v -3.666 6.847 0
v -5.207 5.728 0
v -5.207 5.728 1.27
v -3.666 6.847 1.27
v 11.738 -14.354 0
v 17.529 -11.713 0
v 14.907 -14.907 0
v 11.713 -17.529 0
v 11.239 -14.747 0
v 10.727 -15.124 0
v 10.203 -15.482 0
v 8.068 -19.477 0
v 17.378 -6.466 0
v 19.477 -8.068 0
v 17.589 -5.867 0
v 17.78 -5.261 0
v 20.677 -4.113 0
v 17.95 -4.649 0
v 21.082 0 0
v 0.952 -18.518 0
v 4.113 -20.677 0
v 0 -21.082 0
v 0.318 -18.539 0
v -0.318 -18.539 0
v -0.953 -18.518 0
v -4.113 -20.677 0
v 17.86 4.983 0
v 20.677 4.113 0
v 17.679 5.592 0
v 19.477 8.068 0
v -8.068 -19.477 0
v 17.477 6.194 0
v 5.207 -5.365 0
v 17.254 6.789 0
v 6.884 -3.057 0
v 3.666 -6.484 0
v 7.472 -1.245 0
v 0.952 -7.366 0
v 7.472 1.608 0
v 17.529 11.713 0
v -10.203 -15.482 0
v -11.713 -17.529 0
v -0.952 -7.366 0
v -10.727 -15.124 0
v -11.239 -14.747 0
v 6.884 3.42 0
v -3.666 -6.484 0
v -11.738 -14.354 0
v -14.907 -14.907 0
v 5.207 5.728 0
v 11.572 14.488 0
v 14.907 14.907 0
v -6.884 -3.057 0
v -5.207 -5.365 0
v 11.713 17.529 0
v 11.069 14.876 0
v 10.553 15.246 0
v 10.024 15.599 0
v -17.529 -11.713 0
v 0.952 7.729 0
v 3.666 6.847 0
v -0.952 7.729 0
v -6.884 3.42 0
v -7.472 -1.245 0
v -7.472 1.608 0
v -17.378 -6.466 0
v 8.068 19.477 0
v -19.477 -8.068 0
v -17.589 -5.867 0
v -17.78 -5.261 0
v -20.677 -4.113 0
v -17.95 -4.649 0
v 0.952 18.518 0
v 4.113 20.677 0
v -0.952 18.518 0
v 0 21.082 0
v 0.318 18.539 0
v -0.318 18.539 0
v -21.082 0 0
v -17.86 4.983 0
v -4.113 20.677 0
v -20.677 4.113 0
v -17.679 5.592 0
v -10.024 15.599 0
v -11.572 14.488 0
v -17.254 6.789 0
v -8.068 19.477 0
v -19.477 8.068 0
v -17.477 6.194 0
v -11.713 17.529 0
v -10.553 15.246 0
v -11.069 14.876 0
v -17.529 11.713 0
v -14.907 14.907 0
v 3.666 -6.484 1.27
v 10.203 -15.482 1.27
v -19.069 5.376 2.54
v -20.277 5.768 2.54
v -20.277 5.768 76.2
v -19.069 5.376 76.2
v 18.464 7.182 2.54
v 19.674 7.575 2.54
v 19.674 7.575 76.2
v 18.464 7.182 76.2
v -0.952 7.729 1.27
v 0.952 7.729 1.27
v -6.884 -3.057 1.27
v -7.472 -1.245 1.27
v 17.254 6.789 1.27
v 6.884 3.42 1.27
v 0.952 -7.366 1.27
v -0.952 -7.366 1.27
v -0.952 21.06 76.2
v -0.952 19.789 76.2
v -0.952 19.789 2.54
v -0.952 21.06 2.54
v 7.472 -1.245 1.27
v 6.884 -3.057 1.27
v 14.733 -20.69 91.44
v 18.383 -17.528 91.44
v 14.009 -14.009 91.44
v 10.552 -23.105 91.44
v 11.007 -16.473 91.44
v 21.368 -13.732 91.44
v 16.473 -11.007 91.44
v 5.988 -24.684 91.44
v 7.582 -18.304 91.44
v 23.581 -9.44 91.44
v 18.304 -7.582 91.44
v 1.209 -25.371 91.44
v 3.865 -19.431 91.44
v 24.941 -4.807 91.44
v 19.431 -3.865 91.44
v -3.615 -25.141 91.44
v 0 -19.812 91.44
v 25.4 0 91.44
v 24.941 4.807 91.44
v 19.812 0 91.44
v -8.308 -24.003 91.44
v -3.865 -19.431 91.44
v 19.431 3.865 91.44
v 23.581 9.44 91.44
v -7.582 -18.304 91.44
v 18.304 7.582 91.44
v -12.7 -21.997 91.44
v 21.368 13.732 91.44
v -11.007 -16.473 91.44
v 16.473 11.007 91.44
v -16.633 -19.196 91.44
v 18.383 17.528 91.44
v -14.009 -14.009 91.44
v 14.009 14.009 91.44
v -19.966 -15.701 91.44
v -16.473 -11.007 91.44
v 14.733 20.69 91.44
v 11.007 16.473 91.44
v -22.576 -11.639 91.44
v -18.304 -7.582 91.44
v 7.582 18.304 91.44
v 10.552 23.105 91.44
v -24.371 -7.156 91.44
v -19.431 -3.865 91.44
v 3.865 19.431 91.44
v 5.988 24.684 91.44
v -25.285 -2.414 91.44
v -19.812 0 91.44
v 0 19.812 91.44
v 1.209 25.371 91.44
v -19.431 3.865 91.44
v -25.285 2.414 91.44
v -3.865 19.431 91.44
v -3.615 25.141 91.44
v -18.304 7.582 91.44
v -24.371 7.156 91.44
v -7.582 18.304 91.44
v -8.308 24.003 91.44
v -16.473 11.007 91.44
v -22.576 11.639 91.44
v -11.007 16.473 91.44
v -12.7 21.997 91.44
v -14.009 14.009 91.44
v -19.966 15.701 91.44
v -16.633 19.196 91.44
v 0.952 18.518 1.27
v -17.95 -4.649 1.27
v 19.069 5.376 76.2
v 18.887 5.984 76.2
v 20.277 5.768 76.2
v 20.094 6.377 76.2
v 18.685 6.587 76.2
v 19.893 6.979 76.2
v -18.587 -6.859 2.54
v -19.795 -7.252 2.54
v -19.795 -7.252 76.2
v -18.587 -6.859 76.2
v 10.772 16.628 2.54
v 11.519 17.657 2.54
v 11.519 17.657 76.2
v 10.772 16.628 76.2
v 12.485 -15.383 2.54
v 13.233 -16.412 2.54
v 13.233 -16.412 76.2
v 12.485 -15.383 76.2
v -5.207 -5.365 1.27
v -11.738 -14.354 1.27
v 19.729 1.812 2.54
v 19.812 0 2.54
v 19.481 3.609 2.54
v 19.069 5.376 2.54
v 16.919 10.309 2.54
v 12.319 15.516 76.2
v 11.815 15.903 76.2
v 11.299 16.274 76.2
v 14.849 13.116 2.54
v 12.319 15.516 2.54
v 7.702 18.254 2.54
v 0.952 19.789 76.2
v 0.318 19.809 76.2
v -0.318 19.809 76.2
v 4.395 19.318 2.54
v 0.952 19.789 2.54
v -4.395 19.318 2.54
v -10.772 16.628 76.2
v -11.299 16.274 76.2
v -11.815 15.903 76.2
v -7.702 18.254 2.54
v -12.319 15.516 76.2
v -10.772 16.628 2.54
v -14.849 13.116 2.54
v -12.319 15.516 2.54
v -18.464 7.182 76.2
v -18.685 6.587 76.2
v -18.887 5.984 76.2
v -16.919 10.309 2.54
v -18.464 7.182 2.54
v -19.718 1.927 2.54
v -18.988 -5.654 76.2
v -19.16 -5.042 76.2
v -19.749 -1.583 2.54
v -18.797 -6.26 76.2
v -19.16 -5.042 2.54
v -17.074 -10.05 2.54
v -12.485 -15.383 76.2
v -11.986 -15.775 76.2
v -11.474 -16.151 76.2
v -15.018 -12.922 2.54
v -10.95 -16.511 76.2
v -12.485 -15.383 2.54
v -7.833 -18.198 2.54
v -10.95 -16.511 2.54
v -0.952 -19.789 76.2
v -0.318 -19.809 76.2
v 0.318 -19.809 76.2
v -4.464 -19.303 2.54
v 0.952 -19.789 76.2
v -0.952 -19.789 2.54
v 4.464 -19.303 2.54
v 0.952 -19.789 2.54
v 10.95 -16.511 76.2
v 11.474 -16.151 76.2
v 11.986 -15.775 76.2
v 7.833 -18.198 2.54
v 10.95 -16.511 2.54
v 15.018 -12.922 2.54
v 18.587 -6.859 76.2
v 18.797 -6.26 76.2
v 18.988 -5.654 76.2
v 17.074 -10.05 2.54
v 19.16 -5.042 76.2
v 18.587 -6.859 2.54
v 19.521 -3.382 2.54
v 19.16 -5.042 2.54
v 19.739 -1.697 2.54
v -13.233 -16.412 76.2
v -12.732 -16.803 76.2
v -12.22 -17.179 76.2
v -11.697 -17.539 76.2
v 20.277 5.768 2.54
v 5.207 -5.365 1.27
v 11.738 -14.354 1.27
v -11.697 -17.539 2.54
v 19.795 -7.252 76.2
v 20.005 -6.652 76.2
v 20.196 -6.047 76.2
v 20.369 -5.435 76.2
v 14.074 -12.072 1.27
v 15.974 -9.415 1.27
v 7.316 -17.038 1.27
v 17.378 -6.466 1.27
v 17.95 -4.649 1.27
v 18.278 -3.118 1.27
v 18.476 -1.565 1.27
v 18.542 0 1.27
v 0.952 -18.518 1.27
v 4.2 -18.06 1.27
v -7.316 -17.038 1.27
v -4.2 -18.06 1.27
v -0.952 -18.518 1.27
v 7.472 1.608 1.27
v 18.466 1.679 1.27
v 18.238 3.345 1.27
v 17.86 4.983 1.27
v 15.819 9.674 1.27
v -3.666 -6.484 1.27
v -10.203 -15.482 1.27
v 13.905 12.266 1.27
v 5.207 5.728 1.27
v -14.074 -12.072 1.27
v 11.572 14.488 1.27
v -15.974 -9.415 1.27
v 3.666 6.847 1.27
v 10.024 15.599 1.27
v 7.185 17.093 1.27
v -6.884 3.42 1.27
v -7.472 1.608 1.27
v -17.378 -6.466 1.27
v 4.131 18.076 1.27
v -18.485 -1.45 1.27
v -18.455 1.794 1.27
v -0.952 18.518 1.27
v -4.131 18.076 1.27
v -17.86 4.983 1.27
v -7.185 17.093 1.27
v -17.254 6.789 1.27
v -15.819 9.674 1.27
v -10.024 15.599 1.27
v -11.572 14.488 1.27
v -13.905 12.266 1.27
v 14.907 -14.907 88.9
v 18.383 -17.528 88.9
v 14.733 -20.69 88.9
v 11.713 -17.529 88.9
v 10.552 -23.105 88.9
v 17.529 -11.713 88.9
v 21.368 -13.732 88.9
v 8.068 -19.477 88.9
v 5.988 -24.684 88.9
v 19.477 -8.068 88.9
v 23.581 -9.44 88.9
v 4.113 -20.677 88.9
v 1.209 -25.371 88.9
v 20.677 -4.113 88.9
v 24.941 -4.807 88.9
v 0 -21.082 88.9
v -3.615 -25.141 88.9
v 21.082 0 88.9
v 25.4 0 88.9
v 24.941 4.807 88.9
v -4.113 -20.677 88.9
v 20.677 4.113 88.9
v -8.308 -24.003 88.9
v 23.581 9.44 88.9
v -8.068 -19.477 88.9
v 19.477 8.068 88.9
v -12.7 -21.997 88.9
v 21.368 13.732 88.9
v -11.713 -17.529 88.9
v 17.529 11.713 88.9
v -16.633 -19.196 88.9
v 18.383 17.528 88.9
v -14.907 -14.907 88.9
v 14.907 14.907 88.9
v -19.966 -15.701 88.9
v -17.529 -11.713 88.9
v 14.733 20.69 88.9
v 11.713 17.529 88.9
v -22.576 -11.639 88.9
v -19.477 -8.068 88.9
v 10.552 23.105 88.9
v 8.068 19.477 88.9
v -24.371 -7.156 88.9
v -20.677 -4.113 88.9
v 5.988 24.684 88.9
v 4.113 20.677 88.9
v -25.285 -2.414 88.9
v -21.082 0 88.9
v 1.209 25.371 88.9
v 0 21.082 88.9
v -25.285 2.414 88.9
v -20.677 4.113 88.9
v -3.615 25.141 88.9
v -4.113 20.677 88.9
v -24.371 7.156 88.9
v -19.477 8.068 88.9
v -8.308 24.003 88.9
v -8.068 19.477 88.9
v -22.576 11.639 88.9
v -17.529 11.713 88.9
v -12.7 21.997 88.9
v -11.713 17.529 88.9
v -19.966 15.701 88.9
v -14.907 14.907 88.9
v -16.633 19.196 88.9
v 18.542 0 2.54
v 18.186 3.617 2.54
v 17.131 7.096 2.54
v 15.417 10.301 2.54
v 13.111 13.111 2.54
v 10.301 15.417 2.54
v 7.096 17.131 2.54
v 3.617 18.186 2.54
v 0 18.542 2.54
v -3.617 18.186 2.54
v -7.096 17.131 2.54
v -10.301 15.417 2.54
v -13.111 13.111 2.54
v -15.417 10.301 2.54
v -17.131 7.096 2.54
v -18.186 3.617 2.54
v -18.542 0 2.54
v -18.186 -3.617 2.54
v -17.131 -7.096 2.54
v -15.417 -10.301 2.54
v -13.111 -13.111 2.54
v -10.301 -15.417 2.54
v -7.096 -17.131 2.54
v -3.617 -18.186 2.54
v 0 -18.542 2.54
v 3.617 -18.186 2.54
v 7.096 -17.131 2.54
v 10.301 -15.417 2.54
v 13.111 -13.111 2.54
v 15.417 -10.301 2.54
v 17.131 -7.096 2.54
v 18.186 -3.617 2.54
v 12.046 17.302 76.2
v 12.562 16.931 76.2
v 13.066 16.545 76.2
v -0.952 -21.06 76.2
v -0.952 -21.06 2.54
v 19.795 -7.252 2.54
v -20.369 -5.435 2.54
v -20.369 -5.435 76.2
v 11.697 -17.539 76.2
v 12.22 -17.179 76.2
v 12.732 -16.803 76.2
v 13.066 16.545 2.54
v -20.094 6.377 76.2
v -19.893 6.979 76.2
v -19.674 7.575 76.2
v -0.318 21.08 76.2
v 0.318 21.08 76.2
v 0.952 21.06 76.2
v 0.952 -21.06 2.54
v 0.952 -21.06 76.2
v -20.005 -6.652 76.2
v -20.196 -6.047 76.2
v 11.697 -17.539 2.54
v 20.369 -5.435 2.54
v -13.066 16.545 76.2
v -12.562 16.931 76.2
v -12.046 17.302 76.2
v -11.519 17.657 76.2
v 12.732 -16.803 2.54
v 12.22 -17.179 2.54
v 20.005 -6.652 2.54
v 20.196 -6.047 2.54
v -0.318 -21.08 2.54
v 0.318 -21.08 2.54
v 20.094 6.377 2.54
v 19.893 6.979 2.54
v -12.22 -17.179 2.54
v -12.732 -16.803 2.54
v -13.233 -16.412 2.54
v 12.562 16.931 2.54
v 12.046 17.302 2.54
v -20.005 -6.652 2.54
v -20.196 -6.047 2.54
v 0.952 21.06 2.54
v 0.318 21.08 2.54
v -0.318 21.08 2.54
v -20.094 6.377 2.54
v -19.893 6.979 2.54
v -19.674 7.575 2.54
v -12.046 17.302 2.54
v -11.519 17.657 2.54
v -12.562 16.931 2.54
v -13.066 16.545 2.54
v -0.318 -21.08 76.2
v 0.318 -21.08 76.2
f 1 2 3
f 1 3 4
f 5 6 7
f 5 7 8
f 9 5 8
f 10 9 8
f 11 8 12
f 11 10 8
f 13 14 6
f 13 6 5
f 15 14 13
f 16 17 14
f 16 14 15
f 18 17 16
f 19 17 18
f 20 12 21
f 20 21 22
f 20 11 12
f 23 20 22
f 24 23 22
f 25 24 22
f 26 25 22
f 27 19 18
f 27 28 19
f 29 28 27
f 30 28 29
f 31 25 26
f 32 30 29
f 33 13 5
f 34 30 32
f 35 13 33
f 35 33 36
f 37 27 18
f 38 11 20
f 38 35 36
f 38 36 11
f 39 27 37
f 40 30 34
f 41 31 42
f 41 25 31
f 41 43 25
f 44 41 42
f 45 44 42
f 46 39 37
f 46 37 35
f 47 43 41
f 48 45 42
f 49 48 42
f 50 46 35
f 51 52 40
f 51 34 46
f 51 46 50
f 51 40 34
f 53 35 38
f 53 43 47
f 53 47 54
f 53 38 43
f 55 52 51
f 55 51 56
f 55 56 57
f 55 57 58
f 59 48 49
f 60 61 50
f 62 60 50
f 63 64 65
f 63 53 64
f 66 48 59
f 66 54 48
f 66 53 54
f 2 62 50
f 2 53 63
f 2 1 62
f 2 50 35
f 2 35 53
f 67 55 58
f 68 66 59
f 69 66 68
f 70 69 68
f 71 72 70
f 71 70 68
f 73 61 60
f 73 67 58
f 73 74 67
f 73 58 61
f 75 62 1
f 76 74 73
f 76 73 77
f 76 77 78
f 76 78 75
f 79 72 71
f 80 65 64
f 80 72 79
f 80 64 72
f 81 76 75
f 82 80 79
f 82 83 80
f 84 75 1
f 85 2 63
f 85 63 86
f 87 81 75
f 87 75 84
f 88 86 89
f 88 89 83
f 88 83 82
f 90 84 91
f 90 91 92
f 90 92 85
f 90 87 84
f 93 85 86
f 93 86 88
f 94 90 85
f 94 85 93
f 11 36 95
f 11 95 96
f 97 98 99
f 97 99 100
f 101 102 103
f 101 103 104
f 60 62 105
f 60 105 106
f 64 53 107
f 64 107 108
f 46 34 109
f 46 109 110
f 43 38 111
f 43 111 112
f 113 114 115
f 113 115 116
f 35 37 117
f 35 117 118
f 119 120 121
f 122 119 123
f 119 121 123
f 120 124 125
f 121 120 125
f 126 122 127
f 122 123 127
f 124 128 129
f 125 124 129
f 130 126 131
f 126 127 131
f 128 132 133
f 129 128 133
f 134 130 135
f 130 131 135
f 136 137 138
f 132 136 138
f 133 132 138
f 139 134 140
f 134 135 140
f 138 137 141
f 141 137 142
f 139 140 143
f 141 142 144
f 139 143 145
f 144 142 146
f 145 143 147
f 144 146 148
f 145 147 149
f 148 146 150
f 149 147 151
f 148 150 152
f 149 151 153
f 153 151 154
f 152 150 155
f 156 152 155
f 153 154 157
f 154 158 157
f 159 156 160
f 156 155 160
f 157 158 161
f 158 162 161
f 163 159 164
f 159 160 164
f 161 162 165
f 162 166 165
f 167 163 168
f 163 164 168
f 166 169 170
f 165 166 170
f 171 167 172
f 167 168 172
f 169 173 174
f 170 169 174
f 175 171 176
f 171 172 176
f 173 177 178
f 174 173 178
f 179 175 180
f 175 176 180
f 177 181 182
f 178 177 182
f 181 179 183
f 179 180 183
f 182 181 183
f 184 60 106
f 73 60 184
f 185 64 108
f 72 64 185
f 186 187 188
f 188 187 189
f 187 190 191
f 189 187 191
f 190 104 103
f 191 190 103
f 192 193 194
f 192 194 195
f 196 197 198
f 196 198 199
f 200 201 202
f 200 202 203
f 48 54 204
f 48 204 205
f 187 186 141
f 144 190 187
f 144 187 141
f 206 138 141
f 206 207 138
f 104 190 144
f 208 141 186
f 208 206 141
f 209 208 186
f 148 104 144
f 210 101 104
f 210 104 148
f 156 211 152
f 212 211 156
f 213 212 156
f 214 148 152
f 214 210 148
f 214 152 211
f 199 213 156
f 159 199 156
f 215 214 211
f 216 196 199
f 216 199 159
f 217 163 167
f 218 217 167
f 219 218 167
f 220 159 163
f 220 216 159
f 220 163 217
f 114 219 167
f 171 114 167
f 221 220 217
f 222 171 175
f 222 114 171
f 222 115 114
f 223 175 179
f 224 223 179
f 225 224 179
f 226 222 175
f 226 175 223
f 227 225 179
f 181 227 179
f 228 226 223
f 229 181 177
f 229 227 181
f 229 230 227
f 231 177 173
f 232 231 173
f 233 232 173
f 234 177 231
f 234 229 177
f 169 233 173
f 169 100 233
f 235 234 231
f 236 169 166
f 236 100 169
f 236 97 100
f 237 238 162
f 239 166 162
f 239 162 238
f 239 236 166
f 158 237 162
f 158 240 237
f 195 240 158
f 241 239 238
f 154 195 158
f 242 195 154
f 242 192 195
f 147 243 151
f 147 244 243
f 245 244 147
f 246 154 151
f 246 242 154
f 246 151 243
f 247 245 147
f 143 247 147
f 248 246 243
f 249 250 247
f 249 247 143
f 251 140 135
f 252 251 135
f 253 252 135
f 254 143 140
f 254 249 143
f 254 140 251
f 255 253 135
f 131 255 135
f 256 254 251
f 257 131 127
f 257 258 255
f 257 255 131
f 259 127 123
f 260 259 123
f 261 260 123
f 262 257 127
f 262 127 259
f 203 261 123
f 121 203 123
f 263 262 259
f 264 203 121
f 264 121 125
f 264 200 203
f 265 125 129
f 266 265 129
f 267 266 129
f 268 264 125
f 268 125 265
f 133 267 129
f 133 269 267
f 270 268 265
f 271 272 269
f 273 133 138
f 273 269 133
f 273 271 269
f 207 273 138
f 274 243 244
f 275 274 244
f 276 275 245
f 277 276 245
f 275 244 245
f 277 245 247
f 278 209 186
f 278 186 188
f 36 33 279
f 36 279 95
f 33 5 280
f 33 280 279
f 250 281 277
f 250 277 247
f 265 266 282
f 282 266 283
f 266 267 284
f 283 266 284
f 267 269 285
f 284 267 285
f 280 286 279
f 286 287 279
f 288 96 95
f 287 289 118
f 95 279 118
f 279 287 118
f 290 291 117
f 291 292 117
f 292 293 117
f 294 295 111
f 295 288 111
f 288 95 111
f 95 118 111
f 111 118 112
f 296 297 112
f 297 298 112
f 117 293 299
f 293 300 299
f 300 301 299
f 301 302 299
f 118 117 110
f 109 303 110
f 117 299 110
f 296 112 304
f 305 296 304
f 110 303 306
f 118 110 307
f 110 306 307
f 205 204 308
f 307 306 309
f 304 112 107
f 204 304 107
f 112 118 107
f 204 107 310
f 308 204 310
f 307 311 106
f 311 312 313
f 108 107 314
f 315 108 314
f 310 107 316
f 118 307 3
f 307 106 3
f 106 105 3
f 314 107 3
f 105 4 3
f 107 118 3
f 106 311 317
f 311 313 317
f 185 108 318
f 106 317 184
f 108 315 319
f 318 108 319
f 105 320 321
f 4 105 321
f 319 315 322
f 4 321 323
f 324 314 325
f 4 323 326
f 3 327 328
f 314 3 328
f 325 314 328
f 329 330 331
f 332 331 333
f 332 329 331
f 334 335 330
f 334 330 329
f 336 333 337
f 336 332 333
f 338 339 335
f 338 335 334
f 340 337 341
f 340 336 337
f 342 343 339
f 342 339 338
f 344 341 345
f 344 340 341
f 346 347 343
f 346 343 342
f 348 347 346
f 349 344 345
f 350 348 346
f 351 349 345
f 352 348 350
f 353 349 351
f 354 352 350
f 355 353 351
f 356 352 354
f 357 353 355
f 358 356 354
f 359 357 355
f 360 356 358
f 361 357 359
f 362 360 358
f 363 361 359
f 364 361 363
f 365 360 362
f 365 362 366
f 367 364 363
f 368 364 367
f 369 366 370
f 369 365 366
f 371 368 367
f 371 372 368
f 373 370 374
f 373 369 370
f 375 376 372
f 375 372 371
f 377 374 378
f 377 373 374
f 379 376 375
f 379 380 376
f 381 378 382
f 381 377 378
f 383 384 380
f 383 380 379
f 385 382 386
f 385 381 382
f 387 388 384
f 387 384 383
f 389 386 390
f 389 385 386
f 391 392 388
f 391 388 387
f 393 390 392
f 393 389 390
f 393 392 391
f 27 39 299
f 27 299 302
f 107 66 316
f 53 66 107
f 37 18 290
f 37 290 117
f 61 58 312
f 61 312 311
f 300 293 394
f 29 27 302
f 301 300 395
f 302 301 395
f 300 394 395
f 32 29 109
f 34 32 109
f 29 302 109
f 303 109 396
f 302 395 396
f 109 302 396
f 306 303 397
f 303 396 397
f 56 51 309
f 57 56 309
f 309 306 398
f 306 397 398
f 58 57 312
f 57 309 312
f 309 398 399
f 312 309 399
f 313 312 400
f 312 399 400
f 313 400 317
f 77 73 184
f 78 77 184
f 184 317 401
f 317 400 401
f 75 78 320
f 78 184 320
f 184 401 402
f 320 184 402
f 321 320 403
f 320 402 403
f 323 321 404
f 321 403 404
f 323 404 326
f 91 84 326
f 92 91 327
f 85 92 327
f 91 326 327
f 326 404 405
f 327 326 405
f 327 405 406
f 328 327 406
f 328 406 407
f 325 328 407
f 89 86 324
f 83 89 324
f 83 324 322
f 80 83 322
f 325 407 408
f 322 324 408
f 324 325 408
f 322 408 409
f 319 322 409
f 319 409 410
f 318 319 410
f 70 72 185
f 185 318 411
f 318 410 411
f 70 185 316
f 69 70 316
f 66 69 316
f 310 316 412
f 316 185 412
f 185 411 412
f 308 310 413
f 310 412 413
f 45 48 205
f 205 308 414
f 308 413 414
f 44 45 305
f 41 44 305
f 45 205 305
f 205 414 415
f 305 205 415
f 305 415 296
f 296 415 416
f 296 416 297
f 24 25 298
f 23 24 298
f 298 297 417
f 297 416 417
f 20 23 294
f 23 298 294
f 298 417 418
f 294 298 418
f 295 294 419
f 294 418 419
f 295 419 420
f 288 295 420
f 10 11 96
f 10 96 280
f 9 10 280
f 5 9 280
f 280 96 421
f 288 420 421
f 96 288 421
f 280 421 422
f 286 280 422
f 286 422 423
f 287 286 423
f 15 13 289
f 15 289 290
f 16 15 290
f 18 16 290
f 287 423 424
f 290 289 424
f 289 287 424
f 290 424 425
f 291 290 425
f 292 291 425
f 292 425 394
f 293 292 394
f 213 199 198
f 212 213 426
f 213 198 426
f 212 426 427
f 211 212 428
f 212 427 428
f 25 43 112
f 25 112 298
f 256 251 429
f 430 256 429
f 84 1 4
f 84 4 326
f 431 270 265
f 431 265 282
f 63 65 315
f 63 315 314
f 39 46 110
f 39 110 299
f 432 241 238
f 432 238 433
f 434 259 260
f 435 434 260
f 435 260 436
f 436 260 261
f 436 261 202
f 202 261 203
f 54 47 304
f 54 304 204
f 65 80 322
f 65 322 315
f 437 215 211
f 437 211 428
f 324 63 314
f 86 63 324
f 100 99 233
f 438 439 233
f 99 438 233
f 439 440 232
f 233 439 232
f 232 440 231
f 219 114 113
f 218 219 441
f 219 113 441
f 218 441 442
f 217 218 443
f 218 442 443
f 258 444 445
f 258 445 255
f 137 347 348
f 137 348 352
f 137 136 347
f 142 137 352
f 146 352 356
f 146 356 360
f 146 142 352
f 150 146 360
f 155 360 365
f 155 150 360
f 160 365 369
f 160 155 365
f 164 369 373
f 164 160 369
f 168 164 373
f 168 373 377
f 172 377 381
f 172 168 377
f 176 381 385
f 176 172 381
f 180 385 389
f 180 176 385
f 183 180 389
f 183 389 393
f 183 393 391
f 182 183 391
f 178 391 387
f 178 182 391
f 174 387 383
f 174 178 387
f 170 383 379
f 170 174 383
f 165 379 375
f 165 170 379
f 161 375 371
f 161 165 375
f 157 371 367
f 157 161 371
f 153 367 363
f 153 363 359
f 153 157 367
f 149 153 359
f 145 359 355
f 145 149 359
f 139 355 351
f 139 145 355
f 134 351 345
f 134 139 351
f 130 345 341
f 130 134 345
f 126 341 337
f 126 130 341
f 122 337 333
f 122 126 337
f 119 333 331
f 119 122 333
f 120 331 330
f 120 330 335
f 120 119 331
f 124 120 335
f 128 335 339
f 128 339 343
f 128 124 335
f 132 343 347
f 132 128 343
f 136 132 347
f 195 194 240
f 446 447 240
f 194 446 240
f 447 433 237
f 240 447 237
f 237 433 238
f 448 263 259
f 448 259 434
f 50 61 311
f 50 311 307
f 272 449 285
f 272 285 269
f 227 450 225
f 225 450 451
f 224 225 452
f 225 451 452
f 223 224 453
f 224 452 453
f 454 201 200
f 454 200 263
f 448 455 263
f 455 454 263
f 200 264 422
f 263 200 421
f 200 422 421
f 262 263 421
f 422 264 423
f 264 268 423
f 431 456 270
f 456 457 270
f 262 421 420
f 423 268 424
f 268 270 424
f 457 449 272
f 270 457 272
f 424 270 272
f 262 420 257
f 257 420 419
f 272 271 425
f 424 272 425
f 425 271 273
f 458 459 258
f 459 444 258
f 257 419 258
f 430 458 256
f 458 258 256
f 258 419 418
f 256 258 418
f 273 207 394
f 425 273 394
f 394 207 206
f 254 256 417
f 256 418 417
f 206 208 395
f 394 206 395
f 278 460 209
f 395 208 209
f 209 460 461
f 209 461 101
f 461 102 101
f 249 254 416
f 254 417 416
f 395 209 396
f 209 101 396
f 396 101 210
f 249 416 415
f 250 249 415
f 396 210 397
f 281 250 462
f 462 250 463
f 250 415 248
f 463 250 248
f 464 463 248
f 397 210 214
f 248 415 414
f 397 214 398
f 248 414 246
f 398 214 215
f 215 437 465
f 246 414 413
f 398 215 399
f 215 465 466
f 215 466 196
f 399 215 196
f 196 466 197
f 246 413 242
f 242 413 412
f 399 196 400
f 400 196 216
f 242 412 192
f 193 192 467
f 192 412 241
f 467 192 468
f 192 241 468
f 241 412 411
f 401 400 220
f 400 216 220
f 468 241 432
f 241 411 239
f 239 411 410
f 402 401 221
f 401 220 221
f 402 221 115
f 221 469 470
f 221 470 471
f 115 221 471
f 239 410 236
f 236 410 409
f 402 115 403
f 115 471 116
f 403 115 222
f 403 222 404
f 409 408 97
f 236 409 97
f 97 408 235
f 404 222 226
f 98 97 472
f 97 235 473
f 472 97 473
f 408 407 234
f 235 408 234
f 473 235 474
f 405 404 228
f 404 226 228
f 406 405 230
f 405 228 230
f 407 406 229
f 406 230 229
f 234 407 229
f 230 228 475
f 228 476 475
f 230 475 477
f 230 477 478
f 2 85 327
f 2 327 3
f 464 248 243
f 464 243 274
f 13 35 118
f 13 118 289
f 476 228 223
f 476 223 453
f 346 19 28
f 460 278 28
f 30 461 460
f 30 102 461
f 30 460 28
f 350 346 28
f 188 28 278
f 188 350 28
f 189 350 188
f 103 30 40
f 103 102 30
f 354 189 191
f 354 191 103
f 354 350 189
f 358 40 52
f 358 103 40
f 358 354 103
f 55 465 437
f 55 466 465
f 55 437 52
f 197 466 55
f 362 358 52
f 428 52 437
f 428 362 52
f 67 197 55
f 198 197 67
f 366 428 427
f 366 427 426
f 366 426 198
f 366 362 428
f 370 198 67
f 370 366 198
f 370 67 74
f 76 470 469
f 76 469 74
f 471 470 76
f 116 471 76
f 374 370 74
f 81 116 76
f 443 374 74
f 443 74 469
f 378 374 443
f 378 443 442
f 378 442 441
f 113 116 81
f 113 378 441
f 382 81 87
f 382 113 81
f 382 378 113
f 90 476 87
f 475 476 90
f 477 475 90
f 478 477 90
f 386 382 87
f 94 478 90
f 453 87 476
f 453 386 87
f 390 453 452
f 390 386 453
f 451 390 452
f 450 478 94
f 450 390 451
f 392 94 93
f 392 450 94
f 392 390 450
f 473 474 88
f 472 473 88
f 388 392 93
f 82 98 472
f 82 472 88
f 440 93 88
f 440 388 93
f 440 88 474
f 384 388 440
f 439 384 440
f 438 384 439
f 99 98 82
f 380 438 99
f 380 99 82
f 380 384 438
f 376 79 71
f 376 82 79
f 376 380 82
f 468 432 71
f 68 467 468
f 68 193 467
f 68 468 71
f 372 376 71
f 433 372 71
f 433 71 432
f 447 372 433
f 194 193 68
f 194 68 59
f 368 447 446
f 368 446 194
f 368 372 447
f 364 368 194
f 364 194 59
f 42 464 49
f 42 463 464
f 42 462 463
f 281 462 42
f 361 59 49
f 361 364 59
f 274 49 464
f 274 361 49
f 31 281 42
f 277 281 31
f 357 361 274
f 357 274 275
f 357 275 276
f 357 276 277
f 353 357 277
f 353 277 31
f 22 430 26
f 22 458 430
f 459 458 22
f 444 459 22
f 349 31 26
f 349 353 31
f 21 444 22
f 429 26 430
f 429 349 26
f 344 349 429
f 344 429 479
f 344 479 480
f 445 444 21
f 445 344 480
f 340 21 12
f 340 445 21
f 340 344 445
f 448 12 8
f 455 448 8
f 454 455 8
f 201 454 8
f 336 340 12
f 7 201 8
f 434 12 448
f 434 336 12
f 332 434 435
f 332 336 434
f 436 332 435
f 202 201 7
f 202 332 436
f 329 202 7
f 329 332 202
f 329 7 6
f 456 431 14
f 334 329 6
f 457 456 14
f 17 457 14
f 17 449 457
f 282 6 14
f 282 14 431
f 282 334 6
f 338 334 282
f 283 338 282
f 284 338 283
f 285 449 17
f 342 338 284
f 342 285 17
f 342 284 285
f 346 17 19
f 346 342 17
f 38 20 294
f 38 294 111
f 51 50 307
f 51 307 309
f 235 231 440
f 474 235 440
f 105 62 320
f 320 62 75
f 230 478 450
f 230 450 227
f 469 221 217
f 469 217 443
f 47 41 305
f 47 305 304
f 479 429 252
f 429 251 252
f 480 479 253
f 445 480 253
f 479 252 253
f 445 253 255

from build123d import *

# Parameters (mm, degrees)
F2_T     = -1.27
F3_DEPTH = 1.27
F5_R     = 19.685
F6_DEPTH = 25.4
F7_W     = 1.905
F7_H     = 19.812
F8_DEPTH = 76.2
F9_W     = 2.54
F9_H     = 2.54


with BuildPart() as f1:
    # F0 (on Front) → F1 (revolve)
    with BuildSketch(Plane.XZ):
        Polygon((0, 2.54), (0, 0), (21.082, 0), (21.082, 88.9), (0, 88.9), align=None)
        Polygon((0, 91.44), (0, 88.9), (21.082, 88.9), (25.4, 88.9), (25.4, 91.44), align=None)
    revolve(axis=Axis((0, 0, 44.45), (0, 0, 1)))

    # F2
    f2_openings = [f1.faces().sort_by_distance(p)[0] for p in [
        (0, 0, 91.44),
    ]]
    offset(amount=F2_T, openings=f2_openings, kind=Kind.INTERSECTION)

    # F3 (add): a face of the model
    f3_faces = [f1.faces().sort_by_distance(p)[0] for p in [
        (-23.4475005348, 0, 90.17),
    ]]
    extrude(f3_faces, amount=F3_DEPTH)

    # F5 (on offset) → F6 (cut)
    with BuildSketch(Plane.XY.offset(88.9)):
        Circle(F5_R)
    extrude(amount=F6_DEPTH, mode=Mode.SUBTRACT)

    # F7 (on Top) → F8 (cut)
    with BuildSketch(Plane.XY):
        Polygon((0.9525, -27.178), (0.9525, -7.366), (0, -7.366), (-0.9525, -7.366), (-0.9525, -27.178), align=None)
        Polygon((5.2068558942, -5.3647039539), (3.6656785199, -6.4844348595), (15.3108799383, -22.5126795521), (16.8520573126, -21.3929486464), align=None)
        Polygon((7.4723698113, -1.2449737892), (6.883692437, -3.0567364527), (25.7260241378, -9.1789811453), (26.3147015121, -7.3672184818), align=None)
        Polygon((6.883692437, 3.4195935956), (7.4723698113, 1.6078309321), (26.3147015121, 7.7300756246), (25.7260241378, 9.5418382882), align=None)
        Polygon((3.6656785199, 6.8472920024), (5.2068558942, 5.7275610967), (16.8520573126, 21.7558057893), (15.3108799383, 22.8755366949), align=None)
        with Locations((0, 17.6348571429)):
            Rectangle(F7_W, F7_H)
        Polygon((-5.2068558942, 5.7275610967), (-3.6656785199, 6.8472920024), (-15.3108799383, 22.8755366949), (-16.8520573126, 21.7558057893), align=None)
        Polygon((-7.4723698113, 1.6078309321), (-6.883692437, 3.4195935956), (-25.7260241378, 9.5418382882), (-26.3147015121, 7.7300756246), align=None)
        Polygon((-6.883692437, -3.0567364527), (-7.4723698113, -1.2449737892), (-26.3147015121, -7.3672184818), (-25.7260241378, -9.1789811453), align=None)
        Polygon((-3.6656785199, -6.4844348595), (-5.2068558942, -5.3647039539), (-16.8520573126, -21.3929486464), (-15.3108799383, -22.5126795521), align=None)
    extrude(amount=F8_DEPTH, mode=Mode.SUBTRACT)

    # F9 (on Front) → F10 (revolve)
    with BuildSketch(Plane.XZ):
        with Locations((19.812, 1.27)):
            Rectangle(F9_W, F9_H)
    revolve(axis=Axis((0, 0, 1.27), (0, 0, 1)))


solid = f1.part
